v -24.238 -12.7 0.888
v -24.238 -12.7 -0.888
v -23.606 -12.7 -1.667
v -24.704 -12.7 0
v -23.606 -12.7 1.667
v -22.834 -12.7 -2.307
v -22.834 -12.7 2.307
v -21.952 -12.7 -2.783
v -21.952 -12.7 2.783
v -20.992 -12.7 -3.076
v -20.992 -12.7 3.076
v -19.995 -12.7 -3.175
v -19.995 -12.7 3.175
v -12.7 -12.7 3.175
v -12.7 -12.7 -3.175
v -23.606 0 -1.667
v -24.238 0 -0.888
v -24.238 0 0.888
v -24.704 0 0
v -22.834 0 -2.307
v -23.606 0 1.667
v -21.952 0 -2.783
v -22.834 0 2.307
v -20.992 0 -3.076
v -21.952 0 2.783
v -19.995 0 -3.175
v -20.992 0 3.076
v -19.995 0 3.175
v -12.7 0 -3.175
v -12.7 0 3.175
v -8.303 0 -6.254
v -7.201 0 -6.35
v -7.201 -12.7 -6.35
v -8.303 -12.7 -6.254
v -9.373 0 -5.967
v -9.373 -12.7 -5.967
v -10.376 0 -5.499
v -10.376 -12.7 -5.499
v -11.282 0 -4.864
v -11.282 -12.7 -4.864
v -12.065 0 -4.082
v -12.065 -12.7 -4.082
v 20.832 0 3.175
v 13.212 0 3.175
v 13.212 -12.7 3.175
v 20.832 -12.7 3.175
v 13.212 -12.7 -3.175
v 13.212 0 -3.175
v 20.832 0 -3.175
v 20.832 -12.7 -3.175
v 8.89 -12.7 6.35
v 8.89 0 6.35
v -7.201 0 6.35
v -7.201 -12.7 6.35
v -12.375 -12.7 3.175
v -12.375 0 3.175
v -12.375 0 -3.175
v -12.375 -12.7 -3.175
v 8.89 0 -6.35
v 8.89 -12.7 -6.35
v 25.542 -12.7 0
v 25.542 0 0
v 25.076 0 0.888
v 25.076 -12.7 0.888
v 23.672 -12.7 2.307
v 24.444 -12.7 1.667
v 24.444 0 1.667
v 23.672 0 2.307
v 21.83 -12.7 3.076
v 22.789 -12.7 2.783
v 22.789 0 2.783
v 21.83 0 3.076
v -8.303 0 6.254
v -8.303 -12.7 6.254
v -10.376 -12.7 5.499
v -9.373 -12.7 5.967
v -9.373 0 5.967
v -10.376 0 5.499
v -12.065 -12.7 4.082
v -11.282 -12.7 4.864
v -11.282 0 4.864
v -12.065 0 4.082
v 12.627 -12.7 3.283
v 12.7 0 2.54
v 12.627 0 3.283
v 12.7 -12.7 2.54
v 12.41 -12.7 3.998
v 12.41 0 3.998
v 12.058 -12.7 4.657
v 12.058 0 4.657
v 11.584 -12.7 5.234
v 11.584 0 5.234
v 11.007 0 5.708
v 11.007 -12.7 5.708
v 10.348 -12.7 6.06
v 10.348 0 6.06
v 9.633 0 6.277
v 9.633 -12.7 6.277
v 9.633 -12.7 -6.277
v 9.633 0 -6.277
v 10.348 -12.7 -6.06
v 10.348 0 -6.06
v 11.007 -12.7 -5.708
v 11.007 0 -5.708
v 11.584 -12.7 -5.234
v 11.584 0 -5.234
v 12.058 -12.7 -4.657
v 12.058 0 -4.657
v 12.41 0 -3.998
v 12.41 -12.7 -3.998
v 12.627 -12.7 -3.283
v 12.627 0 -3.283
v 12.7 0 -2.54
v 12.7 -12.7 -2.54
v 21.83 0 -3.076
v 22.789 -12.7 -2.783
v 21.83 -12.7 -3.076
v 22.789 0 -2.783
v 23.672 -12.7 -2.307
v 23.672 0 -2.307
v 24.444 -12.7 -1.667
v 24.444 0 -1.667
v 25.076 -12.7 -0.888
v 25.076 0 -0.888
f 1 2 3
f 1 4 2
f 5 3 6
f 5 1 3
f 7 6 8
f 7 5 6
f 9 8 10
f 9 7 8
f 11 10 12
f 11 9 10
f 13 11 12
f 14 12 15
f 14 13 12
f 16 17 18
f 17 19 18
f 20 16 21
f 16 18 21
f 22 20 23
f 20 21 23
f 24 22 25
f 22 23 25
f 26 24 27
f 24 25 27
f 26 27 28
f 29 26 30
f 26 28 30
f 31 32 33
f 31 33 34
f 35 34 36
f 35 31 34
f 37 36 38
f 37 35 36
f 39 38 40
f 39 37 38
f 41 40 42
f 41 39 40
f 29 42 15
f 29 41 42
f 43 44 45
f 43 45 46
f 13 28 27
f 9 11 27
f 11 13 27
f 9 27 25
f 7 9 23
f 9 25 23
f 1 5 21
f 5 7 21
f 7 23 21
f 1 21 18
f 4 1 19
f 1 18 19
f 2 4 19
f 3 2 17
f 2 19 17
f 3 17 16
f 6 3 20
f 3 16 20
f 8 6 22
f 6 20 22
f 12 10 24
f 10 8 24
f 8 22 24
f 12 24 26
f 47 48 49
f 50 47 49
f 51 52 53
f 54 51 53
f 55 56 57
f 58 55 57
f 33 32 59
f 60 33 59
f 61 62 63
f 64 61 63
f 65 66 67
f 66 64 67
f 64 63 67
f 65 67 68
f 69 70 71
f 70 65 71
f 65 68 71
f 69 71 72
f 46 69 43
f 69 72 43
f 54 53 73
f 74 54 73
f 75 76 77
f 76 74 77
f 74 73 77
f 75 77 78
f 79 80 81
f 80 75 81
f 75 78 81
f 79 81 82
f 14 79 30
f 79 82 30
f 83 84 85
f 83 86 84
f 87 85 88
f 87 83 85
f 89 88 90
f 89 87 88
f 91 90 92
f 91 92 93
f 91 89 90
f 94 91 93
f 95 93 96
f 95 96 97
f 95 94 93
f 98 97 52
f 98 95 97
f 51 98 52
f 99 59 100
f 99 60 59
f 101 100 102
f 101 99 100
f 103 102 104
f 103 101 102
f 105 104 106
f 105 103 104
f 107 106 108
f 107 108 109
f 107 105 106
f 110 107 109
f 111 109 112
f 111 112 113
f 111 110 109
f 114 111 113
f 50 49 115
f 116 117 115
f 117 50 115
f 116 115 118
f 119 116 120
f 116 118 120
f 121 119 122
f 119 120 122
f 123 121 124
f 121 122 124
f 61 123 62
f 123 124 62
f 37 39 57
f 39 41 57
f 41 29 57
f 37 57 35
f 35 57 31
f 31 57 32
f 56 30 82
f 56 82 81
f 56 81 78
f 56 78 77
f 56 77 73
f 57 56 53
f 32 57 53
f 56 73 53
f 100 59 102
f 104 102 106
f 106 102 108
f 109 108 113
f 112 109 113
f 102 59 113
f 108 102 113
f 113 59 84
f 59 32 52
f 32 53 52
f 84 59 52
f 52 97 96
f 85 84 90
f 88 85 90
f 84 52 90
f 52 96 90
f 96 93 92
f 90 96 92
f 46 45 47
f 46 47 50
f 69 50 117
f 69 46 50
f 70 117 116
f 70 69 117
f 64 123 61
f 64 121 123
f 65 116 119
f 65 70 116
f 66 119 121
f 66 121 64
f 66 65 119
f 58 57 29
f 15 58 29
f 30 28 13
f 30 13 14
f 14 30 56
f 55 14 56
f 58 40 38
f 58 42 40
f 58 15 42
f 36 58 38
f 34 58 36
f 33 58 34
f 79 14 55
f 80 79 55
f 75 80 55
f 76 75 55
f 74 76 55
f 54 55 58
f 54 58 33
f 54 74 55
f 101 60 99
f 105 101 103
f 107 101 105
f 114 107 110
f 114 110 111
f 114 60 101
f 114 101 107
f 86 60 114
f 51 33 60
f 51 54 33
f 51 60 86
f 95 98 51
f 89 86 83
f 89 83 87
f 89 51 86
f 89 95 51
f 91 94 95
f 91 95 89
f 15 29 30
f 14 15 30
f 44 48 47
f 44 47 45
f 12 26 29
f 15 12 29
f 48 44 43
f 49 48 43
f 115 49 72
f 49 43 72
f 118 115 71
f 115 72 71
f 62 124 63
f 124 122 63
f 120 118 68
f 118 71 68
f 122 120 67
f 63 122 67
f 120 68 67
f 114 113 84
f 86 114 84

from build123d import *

# Parameters (mm, degrees)
F0_W          = 12.7
F0_H          = 6.35
F1_DEPTH      = 12.7
F0_W_2        = 12.37452721
F2_T1_DEPTH   = 40.1963065702
F3_T1_DEPTH   = 38.1
F3_2_T1_DEPTH = 38.1
F4_R          = 3.81


# Not quite as in the source:
# - a fillet or chamfer that OpenCascade refuses, or shapes differently, is made with other operations: its cross-section is extruded or revolved along the edge and cut away or added


with BuildPart() as f1:
    # F0 (on Front) → F1 (new body)
    with BuildSketch(Plane.XZ):
        with Locations((19.5622947067, 0)):
            Rectangle(F0_W, F0_H)
    extrude(amount=F1_DEPTH)

    # F3: fillet of radius 5.08 on 2 edges, made by hand

    # F3_s2 → F3_t1 (cut)
    with BuildSketch(Plane.XZ.offset(-12.7)):
        with BuildLine():
            ThreePointArc((20.8322947067, -3.175), (24.4243971551, -1.6871024484), (25.9122947067, 1.905))
            Line((25.9122947067, 1.905), (25.9122947067, -3.175))
            Line((25.9122947067, -3.175), (20.8322947067, -3.175))
        make_face()
        with BuildLine():
            ThreePointArc((25.9122947067, -1.905), (24.4243971551, 1.6871024484), (20.8322947067, 3.175))
            Line((20.8322947067, 3.175), (25.9122947067, 3.175))
            Line((25.9122947067, 3.175), (25.9122947067, -1.905))
        make_face()
    extrude(amount=F3_T1_DEPTH, mode=Mode.SUBTRACT)


with BuildPart() as f1b:
    # F0 (on Front) → F1, piece 2 (new body)
    with BuildSketch(Plane.XZ):
        with Locations((-18.887263605, 0)):
            Rectangle(F0_W_2, F0_H)
    extrude(amount=F1_DEPTH)

    # F3#2: fillet of radius 5.08 on 2 edges, made by hand

    # F3_2_s2 → F3_2_t1 (cut)
    with BuildSketch(Plane.XZ.offset(-12.7)):
        with BuildLine():
            ThreePointArc((-25.07452721, 1.905), (-23.5866296584, -1.6871024484), (-19.99452721, -3.175))
            Line((-19.99452721, -3.175), (-25.07452721, -3.175))
            Line((-25.07452721, -3.175), (-25.07452721, 1.905))
        make_face()
        with BuildLine():
            ThreePointArc((-19.99452721, 3.175), (-23.5866296584, 1.6871024484), (-25.07452721, -1.905))
            Line((-25.07452721, -1.905), (-25.07452721, 3.175))
            Line((-25.07452721, 3.175), (-19.99452721, 3.175))
        make_face()
    extrude(amount=F3_2_T1_DEPTH, mode=Mode.SUBTRACT)


with BuildPart() as f1c:
    # F0 (on Front) → F1, piece 3 (new body)
    with BuildSketch(Plane.XZ):
        Polygon((-12.7, -6.35), (12.7, -6.35), (12.7, 6.35), (-12.7, 6.35), (-12.7, 3.175), (-12.37452721, 3.175), (-12.37452721, -3.175), (-12.7, -3.175), align=None)
    extrude(amount=F1_DEPTH)

    # F2: fillet of radius 6.35 on 2 edges, made by hand

    # F2_s2 → F2_t1 (cut)
    with BuildSketch(Plane.XZ.offset(-13.7481532851)):
        with BuildLine():
            ThreePointArc((-7.200738686, 6.35), (-10.375738686, 5.499261314), (-12.7, 3.175))
            Line((-12.7, 3.175), (-12.7, 6.35))
            Line((-12.7, 6.35), (-7.200738686, 6.35))
        make_face()
        with BuildLine():
            ThreePointArc((-7.200738686, -6.35), (-10.375738686, -5.499261314), (-12.7, -3.175))
            Line((-12.7, -3.175), (-12.7, -6.35))
            Line((-12.7, -6.35), (-7.200738686, -6.35))
        make_face()
    extrude(amount=F2_T1_DEPTH, mode=Mode.SUBTRACT)

    # F4
    f4_edges = [f1c.edges().sort_by_distance(p)[0] for p in [
        (12.7, -6.35, 6.35),
        (12.7, -6.35, -6.35),
    ]]
    fillet(f4_edges, radius=F4_R)


solid = Compound([f1.part, f1b.part, f1c.part])
